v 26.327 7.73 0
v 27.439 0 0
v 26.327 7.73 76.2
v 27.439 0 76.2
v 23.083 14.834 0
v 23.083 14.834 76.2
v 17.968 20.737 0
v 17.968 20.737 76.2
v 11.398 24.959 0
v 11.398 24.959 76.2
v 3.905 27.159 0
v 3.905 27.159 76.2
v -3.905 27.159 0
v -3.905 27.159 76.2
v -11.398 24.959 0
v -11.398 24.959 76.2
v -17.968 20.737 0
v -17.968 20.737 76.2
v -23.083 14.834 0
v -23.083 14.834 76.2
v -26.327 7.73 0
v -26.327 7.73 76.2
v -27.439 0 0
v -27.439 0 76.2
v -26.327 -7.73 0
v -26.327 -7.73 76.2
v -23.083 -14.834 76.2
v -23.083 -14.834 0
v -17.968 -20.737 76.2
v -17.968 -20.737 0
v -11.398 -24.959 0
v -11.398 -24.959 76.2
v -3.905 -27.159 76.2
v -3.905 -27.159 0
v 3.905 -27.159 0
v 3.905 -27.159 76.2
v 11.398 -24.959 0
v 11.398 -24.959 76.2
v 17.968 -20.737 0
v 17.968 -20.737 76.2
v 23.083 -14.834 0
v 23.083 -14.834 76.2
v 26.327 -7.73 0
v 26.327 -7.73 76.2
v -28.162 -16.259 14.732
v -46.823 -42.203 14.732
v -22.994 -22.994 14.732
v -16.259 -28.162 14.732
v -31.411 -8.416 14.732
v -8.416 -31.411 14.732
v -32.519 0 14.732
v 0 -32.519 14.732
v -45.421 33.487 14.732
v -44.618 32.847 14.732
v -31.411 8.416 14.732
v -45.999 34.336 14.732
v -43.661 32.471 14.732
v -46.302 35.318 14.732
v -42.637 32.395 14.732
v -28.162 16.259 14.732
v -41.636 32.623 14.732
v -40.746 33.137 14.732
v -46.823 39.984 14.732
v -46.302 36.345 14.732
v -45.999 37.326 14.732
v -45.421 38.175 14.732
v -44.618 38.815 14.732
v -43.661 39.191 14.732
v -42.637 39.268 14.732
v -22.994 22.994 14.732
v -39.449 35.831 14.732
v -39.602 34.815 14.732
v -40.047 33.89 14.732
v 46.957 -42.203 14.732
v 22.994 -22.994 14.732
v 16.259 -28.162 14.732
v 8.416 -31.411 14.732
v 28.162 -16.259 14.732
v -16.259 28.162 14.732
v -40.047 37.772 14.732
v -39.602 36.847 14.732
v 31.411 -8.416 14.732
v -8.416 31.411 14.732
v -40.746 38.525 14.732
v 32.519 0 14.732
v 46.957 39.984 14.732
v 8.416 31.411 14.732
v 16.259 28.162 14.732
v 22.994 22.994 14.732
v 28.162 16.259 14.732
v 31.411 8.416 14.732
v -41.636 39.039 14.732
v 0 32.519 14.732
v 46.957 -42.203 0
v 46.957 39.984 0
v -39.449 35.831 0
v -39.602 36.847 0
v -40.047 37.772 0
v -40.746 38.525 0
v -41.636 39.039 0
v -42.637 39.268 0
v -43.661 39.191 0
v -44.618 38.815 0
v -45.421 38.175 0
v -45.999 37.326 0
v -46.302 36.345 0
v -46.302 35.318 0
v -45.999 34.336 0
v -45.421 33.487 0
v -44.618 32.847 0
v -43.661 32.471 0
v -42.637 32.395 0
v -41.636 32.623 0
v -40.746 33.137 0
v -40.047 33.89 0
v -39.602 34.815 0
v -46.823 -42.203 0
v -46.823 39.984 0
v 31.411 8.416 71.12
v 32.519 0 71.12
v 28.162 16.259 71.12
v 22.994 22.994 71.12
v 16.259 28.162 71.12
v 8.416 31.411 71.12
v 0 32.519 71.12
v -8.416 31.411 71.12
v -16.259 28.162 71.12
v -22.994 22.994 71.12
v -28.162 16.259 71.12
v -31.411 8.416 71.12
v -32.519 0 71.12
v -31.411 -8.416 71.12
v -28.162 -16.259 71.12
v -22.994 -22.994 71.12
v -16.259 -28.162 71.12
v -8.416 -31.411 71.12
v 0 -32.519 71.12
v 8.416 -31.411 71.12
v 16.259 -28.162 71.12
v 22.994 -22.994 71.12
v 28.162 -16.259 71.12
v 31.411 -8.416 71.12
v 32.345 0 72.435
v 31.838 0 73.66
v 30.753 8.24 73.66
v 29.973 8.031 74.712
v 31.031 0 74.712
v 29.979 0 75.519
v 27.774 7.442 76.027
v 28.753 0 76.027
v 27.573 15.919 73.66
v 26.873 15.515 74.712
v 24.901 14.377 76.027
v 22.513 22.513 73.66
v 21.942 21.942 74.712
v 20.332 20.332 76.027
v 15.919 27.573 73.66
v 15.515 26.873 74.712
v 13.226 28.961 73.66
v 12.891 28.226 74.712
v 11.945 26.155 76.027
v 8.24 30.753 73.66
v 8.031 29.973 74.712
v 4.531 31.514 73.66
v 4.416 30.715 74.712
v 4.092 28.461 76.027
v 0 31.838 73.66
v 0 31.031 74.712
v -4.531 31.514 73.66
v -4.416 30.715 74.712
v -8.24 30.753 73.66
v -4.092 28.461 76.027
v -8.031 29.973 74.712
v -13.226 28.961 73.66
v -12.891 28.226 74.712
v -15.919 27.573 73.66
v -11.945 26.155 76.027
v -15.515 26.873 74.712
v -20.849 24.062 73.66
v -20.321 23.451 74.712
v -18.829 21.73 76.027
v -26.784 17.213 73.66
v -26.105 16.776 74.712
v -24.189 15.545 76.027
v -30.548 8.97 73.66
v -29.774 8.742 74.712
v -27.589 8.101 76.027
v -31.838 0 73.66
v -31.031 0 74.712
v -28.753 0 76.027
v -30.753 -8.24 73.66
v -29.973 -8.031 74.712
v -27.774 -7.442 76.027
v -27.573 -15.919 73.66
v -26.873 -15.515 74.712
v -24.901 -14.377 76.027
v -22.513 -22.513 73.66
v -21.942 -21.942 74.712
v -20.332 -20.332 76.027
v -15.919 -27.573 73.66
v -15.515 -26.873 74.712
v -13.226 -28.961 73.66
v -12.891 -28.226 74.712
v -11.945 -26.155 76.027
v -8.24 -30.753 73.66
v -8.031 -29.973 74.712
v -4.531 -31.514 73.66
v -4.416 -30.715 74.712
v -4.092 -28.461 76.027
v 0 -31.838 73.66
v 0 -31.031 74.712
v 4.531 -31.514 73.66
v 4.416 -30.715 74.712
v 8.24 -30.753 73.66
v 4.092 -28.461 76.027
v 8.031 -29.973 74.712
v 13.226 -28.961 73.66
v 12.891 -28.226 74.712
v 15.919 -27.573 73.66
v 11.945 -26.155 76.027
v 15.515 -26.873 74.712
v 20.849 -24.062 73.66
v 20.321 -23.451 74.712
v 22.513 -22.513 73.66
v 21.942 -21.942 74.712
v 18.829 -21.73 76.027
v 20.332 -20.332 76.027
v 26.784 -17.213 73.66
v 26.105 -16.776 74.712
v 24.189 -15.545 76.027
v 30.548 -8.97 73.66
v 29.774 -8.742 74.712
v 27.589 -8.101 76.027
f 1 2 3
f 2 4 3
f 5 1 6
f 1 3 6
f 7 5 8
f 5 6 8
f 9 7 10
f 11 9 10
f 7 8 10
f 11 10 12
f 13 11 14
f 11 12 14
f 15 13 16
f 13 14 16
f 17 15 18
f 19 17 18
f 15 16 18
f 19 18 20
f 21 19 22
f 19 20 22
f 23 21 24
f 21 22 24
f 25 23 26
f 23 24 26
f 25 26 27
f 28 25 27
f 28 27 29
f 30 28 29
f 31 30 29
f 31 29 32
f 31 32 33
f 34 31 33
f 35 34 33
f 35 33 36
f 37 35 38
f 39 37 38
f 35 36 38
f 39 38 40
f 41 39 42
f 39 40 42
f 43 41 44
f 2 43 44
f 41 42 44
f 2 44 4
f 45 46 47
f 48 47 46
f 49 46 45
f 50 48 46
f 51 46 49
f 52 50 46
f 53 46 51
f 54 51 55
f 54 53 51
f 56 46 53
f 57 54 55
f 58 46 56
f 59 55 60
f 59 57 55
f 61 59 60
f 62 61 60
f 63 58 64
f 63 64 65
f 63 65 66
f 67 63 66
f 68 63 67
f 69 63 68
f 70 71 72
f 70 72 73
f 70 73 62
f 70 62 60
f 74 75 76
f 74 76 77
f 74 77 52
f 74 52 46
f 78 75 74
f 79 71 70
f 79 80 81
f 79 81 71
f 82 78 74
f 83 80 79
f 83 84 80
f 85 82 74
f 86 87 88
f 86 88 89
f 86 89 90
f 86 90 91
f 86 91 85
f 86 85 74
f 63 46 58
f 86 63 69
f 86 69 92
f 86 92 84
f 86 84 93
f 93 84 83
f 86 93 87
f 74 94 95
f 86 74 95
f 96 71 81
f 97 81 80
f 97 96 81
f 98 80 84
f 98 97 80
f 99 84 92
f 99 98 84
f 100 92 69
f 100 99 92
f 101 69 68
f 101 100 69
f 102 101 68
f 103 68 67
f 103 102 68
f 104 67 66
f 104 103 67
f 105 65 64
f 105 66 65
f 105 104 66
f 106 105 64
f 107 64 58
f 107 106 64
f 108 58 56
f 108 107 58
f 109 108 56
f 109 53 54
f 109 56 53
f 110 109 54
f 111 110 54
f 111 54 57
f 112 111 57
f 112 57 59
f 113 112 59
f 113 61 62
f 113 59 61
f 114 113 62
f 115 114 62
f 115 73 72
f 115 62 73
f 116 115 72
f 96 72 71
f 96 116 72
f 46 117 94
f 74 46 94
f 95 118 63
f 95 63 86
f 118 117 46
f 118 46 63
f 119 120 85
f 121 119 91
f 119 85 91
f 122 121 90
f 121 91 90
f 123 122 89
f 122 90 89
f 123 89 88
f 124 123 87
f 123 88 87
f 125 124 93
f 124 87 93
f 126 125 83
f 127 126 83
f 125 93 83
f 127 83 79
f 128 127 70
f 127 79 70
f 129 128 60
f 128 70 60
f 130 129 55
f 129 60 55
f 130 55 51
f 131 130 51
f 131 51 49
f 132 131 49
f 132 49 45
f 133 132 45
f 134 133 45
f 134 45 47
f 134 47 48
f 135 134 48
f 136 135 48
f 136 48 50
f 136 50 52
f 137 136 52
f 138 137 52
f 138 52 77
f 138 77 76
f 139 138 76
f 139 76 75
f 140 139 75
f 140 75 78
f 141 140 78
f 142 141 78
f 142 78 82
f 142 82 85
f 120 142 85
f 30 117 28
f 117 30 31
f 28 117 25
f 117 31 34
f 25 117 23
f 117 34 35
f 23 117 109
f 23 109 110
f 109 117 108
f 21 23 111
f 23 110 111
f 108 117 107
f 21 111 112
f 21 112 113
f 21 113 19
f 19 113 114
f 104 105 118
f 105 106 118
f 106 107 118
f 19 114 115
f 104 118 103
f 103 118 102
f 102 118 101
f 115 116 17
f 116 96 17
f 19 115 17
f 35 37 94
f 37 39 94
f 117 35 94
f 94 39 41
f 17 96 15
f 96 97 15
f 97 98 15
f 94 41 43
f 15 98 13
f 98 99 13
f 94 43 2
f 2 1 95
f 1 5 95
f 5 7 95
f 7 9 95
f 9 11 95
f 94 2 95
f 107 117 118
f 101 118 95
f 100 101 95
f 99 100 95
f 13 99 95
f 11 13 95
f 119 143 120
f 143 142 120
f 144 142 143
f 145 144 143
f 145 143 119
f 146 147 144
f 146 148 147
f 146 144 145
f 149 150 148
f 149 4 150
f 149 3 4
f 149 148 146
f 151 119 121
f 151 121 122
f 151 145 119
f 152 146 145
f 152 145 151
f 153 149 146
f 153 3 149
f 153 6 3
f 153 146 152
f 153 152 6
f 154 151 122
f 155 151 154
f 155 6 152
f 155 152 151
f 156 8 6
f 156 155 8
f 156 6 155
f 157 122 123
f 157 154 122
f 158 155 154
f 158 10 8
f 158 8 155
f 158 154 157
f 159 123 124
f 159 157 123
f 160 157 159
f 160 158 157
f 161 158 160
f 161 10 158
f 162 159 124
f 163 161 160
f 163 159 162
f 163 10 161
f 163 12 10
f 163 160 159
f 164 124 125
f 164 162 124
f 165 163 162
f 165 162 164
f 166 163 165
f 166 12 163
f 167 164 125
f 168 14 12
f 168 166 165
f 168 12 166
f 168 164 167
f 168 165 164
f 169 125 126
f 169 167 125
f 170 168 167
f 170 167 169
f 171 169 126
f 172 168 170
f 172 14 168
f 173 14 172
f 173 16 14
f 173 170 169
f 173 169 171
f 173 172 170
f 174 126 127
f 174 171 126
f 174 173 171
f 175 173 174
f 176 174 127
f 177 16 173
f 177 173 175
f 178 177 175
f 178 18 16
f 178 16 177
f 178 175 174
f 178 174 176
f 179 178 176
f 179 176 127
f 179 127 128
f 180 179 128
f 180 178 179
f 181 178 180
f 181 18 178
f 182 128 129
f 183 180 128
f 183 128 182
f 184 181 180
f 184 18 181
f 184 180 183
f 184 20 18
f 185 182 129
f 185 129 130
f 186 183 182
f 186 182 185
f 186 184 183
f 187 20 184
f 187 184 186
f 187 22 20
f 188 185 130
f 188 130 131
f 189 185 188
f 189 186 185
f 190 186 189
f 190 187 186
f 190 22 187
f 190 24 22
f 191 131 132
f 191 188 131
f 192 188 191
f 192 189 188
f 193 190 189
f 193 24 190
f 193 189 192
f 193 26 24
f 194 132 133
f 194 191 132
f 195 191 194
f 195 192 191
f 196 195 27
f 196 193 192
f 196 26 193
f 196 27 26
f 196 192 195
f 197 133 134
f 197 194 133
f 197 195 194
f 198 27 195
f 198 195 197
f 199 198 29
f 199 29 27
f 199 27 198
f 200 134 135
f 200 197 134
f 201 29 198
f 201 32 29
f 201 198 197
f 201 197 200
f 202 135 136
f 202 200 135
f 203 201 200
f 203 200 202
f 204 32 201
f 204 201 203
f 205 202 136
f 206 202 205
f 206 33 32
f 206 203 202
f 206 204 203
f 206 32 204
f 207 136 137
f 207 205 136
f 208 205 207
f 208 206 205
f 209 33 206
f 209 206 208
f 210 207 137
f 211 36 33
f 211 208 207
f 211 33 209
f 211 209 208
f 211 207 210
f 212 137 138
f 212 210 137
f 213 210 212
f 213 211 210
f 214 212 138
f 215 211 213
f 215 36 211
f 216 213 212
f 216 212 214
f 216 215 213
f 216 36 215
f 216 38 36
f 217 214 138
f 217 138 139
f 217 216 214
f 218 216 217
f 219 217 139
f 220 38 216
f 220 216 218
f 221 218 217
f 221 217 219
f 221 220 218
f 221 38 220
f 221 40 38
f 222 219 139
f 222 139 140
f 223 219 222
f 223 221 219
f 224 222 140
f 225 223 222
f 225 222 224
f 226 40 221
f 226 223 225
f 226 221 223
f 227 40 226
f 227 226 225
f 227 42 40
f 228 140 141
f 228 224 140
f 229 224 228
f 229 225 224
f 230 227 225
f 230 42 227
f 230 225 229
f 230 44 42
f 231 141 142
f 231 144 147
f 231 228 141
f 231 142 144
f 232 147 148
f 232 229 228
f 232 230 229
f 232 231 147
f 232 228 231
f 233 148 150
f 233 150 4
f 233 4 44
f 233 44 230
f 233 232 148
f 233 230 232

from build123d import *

# Parameters (mm, degrees)
F0_R     = 32.5185756137
F1_DEPTH = 76.2
F2_R     = 5.08
F3_DEPTH = 124.714
F4_R     = 5.07999
F5_W     = 93.7804728746
F5_H     = 82.1867324412
F6_DEPTH = 14.732
F7_DEPTH = 36.83
F8_R     = 3.4460553294
F9_DEPTH = 19.558


# Not quite as in the source:
# - a fillet or chamfer is up to 0.001 mm smaller than in the source, because OpenCascade refuses the exact size


with BuildPart() as f1:
    # F0 (on Top) → F1 (new body)
    with BuildSketch(Plane.XY):
        Circle(F0_R)
    extrude(amount=F1_DEPTH)

    # F2
    f2_edges = [f1.edges().sort_by_distance(p)[0] for p in [
        (-32.518576, 0, 76.2),
    ]]
    fillet(f2_edges, radius=F2_R)

    # F3 (cut): a face of the model
    f3_faces = [f1.faces().sort_by_distance(p)[0] for p in [
        (0, 0, 76.2),
    ]]
    extrude(f3_faces, amount=-F3_DEPTH, mode=Mode.SUBTRACT)

    # F4 (radius 5.08 in the source; OpenCascade refuses exactly that, so slightly less here)
    f4_edges = [f1.edges().sort_by_distance(p)[0] for p in [
        (-32.518576, 0, 0),
    ]]
    fillet(f4_edges, radius=F4_R)

    # F5 (on Top) → F6 (join)
    with BuildSketch(Plane.XY):
        with Locations((0.0669173896, -1.1091846973)):
            Rectangle(F5_W, F5_H)
    extrude(amount=F6_DEPTH)

    # F7 (cut): a face of the model
    f7_faces = [f1.faces().sort_by_distance(p)[0] for p in [
        (0, 0, 14.732),
    ]]
    extrude(f7_faces, amount=-F7_DEPTH, mode=Mode.SUBTRACT)

    # F8 (on Top) → F9 (cut)
    with BuildSketch(Plane.XY):
        with Locations((-42.8946092725, 35.8311235905)):
            Circle(F8_R)
    extrude(amount=F9_DEPTH, mode=Mode.SUBTRACT)


solid = f1.part
